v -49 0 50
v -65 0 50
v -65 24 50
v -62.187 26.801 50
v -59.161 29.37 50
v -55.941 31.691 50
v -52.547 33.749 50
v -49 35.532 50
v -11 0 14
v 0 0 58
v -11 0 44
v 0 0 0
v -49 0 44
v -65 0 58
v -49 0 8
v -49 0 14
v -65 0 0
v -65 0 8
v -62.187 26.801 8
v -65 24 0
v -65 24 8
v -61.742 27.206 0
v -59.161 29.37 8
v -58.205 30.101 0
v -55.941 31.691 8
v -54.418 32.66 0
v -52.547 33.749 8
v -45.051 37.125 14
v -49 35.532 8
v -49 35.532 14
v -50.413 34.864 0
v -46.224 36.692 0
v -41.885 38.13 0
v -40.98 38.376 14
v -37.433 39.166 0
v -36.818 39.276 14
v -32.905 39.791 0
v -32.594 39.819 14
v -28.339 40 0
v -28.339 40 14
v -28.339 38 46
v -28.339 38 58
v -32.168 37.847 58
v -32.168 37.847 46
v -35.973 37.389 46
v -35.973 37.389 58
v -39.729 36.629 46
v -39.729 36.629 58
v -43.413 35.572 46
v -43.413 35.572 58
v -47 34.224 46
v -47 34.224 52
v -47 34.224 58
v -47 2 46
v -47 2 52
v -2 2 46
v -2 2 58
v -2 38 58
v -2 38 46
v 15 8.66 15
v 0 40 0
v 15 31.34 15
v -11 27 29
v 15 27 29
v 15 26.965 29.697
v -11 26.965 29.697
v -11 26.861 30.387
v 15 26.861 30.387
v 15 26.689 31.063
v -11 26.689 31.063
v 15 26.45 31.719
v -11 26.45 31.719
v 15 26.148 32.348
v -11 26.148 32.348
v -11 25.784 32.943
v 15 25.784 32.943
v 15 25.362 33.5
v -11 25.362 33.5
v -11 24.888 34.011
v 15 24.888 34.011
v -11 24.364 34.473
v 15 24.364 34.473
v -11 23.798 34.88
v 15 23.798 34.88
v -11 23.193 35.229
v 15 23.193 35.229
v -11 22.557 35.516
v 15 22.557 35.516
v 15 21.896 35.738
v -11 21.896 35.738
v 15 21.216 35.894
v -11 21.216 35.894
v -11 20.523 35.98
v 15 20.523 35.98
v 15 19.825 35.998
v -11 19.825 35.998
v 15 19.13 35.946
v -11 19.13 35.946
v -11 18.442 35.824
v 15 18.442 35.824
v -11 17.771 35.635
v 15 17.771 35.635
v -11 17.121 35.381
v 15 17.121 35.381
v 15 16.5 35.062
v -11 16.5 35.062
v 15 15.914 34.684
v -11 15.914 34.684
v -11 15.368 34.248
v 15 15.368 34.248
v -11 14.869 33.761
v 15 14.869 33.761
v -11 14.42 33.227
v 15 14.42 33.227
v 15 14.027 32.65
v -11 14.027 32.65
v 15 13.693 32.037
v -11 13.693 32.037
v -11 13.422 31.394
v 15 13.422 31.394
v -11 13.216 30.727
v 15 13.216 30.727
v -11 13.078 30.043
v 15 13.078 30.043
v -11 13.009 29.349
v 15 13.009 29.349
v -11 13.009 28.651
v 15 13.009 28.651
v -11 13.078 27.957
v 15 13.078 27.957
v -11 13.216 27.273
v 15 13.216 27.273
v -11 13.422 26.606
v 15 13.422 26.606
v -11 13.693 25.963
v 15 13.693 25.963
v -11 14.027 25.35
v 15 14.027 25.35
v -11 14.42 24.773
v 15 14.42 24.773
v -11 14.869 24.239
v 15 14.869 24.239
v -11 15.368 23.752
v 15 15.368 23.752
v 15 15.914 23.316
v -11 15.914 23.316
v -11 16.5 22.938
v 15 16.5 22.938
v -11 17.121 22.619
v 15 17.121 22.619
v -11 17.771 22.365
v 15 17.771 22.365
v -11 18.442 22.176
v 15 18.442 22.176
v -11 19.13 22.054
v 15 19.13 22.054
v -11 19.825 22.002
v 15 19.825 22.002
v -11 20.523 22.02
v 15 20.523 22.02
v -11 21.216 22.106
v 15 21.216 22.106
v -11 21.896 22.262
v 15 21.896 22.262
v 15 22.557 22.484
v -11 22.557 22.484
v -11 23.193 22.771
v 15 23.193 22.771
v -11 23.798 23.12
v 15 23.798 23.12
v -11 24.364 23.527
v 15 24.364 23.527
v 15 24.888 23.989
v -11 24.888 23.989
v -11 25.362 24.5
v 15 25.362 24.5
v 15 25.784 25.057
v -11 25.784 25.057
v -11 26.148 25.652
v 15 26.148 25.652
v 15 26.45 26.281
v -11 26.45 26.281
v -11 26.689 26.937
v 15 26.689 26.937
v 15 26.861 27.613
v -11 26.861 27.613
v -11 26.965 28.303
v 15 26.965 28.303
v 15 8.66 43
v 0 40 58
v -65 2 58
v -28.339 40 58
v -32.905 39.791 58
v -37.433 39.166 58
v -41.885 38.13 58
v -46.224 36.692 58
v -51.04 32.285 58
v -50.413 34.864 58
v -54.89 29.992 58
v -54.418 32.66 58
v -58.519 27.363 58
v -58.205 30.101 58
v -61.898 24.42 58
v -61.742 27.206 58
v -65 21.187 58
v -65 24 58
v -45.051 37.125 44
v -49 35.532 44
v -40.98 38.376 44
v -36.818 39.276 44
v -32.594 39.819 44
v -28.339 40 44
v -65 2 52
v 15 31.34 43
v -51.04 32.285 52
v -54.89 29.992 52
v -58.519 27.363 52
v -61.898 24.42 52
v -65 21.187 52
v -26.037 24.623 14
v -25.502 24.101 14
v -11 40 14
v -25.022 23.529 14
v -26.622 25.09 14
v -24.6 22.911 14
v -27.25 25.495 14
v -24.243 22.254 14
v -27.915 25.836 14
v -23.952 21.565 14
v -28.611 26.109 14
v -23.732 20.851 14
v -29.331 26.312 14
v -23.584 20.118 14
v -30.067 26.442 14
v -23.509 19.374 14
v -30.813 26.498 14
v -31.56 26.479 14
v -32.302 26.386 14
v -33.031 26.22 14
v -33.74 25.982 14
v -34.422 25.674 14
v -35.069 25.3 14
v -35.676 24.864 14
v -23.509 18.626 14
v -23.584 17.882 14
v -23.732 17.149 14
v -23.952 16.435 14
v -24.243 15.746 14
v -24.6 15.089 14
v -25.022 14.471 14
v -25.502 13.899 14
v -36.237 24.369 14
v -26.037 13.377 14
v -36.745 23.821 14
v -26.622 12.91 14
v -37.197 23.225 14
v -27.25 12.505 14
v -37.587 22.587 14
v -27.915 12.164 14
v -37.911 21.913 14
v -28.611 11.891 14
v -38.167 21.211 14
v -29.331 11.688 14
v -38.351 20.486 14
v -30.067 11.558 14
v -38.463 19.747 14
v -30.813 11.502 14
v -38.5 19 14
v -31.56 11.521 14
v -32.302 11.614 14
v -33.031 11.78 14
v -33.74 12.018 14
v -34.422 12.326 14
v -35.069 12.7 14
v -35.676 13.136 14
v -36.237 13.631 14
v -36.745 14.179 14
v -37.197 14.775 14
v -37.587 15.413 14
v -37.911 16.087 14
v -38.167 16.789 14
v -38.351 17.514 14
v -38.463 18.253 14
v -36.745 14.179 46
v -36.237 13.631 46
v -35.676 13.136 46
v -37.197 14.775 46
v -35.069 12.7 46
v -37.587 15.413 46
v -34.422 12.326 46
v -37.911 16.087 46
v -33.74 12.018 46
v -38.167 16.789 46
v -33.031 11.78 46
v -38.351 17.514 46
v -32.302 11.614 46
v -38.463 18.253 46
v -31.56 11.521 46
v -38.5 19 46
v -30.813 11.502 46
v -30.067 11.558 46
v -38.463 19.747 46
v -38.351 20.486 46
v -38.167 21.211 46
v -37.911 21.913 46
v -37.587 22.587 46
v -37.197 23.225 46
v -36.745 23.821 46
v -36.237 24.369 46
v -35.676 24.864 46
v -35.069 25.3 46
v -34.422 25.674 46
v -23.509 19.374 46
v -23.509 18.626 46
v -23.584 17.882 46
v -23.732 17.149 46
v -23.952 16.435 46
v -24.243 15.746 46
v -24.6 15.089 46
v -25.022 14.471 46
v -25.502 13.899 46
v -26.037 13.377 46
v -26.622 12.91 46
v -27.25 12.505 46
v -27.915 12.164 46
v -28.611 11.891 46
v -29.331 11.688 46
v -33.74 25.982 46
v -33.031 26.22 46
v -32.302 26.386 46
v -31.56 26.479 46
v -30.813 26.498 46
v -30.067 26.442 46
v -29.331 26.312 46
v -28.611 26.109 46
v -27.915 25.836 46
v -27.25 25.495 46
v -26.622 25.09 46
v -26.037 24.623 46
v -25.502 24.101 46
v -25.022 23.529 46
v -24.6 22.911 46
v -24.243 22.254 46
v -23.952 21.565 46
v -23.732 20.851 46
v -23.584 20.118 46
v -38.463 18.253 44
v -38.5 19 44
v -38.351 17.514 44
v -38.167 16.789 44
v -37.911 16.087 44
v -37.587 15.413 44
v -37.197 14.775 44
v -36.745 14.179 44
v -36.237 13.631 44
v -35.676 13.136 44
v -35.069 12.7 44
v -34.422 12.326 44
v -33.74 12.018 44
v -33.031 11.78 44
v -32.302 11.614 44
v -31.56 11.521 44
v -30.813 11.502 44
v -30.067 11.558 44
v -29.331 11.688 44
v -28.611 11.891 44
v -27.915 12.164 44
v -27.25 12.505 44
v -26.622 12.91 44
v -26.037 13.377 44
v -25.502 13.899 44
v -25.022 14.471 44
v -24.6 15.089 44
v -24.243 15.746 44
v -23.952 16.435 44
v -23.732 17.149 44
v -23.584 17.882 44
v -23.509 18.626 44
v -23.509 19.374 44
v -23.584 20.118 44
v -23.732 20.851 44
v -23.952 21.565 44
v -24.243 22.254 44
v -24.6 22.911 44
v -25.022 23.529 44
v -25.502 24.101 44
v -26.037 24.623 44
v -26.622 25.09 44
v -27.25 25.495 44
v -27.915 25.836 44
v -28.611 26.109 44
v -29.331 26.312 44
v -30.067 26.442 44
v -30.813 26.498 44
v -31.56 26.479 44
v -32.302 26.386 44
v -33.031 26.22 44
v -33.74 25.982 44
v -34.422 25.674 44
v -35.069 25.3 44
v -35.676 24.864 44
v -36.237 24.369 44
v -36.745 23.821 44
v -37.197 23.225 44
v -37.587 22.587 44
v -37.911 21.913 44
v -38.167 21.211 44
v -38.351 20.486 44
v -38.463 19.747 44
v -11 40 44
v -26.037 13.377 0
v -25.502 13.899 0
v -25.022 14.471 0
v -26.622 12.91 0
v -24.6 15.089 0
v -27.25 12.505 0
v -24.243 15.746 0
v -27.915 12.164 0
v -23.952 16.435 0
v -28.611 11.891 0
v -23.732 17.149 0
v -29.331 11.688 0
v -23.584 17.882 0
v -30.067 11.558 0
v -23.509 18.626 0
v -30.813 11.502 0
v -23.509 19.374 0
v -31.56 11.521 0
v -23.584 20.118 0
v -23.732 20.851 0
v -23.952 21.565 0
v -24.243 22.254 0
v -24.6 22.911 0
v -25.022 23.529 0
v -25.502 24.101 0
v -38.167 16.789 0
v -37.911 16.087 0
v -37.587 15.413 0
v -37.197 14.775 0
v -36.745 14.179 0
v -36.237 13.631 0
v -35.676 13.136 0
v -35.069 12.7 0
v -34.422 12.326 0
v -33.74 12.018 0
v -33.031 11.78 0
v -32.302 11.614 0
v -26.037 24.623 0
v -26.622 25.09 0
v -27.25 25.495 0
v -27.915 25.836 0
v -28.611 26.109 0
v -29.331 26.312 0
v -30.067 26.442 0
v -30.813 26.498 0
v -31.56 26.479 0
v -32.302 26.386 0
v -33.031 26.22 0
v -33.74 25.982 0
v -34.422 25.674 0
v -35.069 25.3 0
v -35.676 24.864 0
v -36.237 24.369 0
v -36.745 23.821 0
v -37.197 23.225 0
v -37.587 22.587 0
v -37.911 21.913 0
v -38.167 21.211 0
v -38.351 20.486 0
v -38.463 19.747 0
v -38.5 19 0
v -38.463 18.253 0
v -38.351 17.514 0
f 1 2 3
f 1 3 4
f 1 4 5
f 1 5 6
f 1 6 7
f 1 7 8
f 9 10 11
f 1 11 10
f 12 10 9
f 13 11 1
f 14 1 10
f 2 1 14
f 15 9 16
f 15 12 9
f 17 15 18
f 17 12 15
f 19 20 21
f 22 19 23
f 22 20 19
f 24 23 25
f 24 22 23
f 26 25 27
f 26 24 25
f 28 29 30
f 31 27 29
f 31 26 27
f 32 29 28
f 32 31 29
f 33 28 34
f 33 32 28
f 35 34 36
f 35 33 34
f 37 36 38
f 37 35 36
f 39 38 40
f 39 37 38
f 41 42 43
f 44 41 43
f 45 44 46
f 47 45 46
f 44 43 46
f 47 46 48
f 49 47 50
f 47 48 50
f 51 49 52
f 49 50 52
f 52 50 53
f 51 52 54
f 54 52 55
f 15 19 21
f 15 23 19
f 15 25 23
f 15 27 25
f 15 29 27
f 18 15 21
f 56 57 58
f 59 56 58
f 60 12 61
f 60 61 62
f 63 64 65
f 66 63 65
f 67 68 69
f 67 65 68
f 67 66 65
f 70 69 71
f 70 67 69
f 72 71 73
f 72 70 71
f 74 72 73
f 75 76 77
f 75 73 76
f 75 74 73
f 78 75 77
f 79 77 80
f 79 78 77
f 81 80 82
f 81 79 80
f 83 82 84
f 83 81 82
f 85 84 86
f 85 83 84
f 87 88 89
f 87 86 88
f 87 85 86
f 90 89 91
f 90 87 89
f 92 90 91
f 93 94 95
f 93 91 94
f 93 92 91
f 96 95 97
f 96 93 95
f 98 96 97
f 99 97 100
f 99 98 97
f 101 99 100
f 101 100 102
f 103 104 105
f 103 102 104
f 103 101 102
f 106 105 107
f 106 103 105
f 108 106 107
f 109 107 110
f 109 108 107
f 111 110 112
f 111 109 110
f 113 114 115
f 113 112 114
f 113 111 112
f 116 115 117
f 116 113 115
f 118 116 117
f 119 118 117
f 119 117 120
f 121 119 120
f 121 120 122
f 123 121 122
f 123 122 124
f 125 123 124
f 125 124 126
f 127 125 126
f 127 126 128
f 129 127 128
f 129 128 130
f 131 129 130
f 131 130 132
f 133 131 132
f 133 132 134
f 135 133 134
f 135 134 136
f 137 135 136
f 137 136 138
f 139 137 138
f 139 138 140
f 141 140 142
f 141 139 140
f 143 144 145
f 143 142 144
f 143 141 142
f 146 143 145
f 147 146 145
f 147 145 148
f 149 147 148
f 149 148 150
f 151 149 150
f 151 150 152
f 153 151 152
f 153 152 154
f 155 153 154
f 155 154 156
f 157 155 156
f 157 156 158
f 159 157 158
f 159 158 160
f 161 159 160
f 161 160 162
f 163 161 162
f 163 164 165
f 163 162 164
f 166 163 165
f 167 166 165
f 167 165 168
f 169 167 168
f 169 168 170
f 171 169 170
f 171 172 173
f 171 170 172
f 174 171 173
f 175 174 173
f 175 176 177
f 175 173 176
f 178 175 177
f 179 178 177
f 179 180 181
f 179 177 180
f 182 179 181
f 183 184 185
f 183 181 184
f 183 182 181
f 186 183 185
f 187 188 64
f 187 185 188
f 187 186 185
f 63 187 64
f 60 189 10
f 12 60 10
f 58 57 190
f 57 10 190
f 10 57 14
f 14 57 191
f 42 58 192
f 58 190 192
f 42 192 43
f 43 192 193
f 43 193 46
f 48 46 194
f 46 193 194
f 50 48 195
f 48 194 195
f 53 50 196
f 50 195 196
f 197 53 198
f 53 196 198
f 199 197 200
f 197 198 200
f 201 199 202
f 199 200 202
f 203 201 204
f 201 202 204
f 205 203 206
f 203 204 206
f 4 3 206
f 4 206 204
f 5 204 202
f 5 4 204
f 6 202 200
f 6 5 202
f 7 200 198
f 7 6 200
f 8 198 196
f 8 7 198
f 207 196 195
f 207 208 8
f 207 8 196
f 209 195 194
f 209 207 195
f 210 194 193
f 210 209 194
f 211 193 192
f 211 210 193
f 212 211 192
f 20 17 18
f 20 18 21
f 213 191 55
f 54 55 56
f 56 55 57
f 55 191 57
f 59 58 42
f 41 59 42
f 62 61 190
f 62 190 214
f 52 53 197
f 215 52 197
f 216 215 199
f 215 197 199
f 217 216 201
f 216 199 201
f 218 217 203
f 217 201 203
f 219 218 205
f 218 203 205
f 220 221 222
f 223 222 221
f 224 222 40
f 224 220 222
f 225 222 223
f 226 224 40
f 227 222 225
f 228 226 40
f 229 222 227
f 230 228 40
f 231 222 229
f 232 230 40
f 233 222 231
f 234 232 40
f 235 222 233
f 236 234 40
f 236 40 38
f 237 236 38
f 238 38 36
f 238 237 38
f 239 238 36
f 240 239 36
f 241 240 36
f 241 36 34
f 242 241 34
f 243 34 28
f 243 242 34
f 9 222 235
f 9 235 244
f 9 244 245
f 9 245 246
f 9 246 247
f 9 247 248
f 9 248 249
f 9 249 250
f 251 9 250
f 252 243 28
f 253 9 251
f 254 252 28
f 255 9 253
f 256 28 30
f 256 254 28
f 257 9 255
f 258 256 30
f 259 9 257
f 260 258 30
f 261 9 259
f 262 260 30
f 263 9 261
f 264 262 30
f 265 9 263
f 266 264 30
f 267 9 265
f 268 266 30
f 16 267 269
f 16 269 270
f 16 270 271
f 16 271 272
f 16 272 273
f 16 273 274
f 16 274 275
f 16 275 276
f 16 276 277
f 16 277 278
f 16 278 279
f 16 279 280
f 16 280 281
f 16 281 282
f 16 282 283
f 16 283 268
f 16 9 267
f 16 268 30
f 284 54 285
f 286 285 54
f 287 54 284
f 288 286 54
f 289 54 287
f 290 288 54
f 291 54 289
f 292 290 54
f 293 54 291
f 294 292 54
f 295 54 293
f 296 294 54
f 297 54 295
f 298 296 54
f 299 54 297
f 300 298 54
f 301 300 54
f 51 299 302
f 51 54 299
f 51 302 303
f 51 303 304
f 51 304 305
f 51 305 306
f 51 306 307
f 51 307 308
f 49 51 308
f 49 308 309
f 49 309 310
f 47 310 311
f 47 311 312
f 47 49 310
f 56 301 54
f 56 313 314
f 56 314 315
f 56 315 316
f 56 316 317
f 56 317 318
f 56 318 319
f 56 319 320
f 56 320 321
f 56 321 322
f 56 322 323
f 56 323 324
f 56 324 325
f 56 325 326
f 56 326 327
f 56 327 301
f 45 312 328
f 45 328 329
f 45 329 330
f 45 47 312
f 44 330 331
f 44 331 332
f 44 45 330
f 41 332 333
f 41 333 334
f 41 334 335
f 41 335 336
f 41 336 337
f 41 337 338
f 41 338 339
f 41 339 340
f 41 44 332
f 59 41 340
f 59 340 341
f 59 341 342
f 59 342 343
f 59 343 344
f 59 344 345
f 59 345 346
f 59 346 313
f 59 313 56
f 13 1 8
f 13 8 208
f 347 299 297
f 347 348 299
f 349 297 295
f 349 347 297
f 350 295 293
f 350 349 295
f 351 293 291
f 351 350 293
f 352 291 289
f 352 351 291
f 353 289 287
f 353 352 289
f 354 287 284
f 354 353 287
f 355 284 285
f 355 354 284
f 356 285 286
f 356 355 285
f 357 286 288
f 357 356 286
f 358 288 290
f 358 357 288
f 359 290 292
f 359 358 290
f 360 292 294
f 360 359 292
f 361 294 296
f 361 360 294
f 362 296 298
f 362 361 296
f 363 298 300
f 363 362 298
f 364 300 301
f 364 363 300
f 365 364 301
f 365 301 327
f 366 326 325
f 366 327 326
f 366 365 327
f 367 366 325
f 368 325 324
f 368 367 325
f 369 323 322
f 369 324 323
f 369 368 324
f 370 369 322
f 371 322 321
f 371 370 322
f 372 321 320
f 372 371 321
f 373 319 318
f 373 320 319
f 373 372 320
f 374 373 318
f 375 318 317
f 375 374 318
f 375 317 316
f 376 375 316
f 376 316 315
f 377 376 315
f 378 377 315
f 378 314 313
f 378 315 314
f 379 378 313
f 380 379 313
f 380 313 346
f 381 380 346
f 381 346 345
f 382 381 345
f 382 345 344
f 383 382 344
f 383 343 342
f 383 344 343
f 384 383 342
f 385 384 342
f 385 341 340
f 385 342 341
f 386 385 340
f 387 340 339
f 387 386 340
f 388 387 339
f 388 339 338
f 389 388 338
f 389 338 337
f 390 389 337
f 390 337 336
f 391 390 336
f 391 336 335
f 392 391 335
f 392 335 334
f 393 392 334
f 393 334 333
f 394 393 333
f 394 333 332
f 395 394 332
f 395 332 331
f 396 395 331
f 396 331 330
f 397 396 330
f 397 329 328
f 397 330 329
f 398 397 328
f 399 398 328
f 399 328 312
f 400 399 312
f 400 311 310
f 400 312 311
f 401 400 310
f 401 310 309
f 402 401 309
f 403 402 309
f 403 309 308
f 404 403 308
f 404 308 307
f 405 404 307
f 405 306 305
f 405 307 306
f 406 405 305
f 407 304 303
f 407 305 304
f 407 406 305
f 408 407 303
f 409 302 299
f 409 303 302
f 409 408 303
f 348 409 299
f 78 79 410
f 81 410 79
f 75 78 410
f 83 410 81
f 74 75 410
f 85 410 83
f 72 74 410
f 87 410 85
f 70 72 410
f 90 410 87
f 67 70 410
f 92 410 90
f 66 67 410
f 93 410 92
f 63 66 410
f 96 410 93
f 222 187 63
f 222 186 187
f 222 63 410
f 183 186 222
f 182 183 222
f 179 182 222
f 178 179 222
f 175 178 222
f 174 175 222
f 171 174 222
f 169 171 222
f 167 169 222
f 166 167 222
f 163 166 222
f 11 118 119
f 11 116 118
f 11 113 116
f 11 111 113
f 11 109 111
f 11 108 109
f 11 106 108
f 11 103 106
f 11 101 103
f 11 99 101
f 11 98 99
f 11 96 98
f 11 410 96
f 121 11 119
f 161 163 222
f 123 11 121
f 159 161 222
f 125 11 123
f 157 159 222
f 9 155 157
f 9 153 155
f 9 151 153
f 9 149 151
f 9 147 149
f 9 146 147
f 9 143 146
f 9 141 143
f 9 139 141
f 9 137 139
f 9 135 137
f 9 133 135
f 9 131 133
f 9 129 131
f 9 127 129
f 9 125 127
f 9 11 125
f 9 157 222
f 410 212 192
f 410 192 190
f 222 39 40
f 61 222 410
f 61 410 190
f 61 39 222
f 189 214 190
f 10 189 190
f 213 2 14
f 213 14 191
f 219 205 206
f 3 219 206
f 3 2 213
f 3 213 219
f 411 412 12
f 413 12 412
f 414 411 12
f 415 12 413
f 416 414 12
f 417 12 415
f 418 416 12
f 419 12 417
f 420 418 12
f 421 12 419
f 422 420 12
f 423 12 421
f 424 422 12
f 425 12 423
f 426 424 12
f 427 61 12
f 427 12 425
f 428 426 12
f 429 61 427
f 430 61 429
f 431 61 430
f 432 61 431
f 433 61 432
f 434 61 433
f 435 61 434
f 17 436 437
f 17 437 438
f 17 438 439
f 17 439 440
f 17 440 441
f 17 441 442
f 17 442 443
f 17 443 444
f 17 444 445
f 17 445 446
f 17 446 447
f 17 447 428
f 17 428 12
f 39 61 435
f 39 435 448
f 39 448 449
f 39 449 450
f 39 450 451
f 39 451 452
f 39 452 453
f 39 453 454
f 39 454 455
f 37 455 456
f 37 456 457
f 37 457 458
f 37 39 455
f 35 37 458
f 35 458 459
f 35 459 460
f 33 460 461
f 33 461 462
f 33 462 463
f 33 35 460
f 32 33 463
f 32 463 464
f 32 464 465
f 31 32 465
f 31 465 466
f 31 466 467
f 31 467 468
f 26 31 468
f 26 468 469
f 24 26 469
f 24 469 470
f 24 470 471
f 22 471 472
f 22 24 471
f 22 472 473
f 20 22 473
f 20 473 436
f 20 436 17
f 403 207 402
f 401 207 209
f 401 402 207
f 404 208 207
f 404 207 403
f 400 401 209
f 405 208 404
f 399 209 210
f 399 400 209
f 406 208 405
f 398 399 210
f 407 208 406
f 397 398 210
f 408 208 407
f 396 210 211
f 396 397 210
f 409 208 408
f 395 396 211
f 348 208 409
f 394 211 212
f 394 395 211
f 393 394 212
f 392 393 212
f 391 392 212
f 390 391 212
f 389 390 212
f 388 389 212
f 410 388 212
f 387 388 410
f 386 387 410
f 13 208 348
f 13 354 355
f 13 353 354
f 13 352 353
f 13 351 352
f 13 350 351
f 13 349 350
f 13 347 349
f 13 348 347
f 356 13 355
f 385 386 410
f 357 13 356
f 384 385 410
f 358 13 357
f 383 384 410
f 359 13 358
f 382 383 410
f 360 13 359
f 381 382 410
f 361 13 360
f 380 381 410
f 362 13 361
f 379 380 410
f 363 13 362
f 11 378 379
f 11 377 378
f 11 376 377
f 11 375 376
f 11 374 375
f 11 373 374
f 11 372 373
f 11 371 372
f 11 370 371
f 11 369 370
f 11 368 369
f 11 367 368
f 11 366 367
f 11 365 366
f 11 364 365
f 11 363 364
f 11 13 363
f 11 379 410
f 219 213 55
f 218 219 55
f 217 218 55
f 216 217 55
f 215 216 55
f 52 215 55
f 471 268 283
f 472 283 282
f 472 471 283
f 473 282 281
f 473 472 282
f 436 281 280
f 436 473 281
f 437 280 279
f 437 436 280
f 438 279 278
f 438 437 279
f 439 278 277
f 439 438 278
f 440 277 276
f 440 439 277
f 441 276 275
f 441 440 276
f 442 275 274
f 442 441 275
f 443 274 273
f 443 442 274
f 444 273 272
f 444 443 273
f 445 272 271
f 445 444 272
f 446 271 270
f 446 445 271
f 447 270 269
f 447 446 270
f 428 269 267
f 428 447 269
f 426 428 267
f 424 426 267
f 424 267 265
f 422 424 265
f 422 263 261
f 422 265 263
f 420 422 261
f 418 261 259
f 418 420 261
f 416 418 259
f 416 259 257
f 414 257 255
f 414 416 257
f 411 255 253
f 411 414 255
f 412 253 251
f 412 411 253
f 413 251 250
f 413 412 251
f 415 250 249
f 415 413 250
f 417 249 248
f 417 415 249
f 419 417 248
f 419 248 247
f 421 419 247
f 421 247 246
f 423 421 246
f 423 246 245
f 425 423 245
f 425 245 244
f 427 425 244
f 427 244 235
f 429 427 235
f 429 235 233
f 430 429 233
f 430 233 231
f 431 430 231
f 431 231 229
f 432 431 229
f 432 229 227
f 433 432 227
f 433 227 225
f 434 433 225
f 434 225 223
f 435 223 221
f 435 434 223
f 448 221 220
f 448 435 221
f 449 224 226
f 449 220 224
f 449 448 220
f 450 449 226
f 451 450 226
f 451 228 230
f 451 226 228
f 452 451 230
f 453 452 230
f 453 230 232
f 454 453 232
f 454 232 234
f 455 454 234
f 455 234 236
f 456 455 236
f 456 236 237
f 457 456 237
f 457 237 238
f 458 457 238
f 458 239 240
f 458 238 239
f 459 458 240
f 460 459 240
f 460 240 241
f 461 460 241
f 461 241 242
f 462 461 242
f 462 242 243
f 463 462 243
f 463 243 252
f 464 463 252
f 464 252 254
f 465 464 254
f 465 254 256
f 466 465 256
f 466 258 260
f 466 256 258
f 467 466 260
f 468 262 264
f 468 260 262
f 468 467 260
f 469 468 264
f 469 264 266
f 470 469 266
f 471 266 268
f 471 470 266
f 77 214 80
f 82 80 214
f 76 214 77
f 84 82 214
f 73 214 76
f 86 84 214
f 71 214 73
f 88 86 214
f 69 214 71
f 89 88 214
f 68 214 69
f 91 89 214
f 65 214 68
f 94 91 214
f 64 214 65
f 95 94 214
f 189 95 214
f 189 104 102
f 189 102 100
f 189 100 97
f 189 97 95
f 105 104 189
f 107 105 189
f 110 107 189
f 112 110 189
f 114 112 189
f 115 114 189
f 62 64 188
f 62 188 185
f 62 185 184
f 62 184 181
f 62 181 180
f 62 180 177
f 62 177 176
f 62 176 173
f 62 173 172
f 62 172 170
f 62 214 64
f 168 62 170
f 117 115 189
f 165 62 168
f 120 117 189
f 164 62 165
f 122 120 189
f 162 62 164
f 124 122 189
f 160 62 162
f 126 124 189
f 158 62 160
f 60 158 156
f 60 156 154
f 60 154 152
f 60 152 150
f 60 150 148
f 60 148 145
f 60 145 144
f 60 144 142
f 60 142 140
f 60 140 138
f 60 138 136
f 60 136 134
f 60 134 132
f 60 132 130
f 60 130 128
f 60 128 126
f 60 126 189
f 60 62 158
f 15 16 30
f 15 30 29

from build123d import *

# Parameters (mm, degrees)
SKETCH1_R               = 7.5
BOSS_EXTRUDE1_DEPTH     = 58
CUT_EXTRUDE1_DEPTH      = 90.381206078
CUT_EXTRUDE1_DEPTH_BACK = 90.381206078
CUT_EXTRUDE2_DEPTH      = 96.859271852
CUT_EXTRUDE2_DEPTH_BACK = 96.859271852
CUT_EXTRUDE3_DEPTH      = 107.60206377
CUT_EXTRUDE3_DEPTH_BACK = 107.60206377
SKETCH7_R               = 7
CUT_EXTRUDE6_DEPTH      = 12
CUT_EXTRUDE7_DEPTH      = 6


with BuildPart() as part:
    # Sketch1 → Boss-Extrude1 (new body)
    with BuildSketch(Plane.XY):
        with BuildLine():
            Line((0, 0), (-65, 0))
            Line((-65, 0), (-65, 24))
            ThreePointArc((-65, 24), (-48.33939444, 35.82575695), (-28.33939444, 40))
            Line((-28.33939444, 40), (0, 40))
            Line((0, 40), (15, 31.339745962))
            Line((15, 31.339745962), (15, 8.660254038))
            Line((15, 8.660254038), (0, 0))
        make_face()
        with Locations(Location((-31, 19, 0), (0, 0, 180))):
            Circle(SKETCH1_R, mode=Mode.SUBTRACT)
    extrude(amount=BOSS_EXTRUDE1_DEPTH)

    # Sketch3 → Cut-Extrude1 (cut, two sides: drawn at the far end of the back side and taken through both)
    with BuildSketch(Plane(origin=(0, 20, 0), x_dir=(1, 0, 0), z_dir=(0, 1, 0)).offset(-CUT_EXTRUDE1_DEPTH_BACK)):
        Polygon((-11, -44), (-11, -14), (-49, -14), (-49, -8), (-65, -8), (-65, -50), (-49, -50), (-49, -44), align=None)
    extrude(amount=CUT_EXTRUDE1_DEPTH + CUT_EXTRUDE1_DEPTH_BACK, mode=Mode.SUBTRACT)

    # Sketch6 → Cut-Extrude2 (cut, two sides: drawn at the far end of the back side and taken through both)
    with BuildSketch(Plane(origin=(0, 0, 0), x_dir=(1, 0, 0), z_dir=(0, 1, 0)).offset(-CUT_EXTRUDE2_DEPTH_BACK)):
        Polygon((0, 0), (15, -15), (15, 0), align=None)
        Polygon((15, -58), (15, -43), (0, -58), align=None)
    extrude(amount=CUT_EXTRUDE2_DEPTH + CUT_EXTRUDE2_DEPTH_BACK, mode=Mode.SUBTRACT)

    # Sketch7 → Cut-Extrude3 (cut, two sides: drawn at the far end of the back side and taken through both)
    with BuildSketch(Plane(origin=(15, 0, 0), x_dir=(0, 0, -1), z_dir=(1, 0, 0)).offset(-CUT_EXTRUDE3_DEPTH_BACK)):
        with Locations(Location((-29, 20, 0), (0, 0, 90))):
            Circle(SKETCH7_R)
    extrude(amount=CUT_EXTRUDE3_DEPTH + CUT_EXTRUDE3_DEPTH_BACK, mode=Mode.SUBTRACT)

    # Sketch8 → Cut-Extrude6 (cut)
    with BuildSketch(Plane.XY.offset(58)):
        with BuildLine():
            Line((-47, 34.224221872), (-47, 2))
            Line((-47, 2), (-2, 2))
            Line((-2, 2), (-2, 38))
            Line((-2, 38), (-28.33939444, 38))
            ThreePointArc((-28.33939444, 38), (-37.858778616, 37.046586751), (-47, 34.224221872))
        make_face()
    extrude(amount=-CUT_EXTRUDE6_DEPTH, mode=Mode.SUBTRACT)

    # Sketch16 → Cut-Extrude7 (cut)
    with BuildSketch(Plane.XY.offset(58)):
        with BuildLine():
            Line((-65, 21.1865019), (-65, 2))
            Line((-65, 2), (-47, 2))
            Line((-47, 2), (-47, 34.224221872))
            ThreePointArc((-47, 34.224221872), (-56.733711161, 28.718330483), (-65, 21.1865019))
        make_face()
    extrude(amount=-CUT_EXTRUDE7_DEPTH, mode=Mode.SUBTRACT)


solid = part.part
